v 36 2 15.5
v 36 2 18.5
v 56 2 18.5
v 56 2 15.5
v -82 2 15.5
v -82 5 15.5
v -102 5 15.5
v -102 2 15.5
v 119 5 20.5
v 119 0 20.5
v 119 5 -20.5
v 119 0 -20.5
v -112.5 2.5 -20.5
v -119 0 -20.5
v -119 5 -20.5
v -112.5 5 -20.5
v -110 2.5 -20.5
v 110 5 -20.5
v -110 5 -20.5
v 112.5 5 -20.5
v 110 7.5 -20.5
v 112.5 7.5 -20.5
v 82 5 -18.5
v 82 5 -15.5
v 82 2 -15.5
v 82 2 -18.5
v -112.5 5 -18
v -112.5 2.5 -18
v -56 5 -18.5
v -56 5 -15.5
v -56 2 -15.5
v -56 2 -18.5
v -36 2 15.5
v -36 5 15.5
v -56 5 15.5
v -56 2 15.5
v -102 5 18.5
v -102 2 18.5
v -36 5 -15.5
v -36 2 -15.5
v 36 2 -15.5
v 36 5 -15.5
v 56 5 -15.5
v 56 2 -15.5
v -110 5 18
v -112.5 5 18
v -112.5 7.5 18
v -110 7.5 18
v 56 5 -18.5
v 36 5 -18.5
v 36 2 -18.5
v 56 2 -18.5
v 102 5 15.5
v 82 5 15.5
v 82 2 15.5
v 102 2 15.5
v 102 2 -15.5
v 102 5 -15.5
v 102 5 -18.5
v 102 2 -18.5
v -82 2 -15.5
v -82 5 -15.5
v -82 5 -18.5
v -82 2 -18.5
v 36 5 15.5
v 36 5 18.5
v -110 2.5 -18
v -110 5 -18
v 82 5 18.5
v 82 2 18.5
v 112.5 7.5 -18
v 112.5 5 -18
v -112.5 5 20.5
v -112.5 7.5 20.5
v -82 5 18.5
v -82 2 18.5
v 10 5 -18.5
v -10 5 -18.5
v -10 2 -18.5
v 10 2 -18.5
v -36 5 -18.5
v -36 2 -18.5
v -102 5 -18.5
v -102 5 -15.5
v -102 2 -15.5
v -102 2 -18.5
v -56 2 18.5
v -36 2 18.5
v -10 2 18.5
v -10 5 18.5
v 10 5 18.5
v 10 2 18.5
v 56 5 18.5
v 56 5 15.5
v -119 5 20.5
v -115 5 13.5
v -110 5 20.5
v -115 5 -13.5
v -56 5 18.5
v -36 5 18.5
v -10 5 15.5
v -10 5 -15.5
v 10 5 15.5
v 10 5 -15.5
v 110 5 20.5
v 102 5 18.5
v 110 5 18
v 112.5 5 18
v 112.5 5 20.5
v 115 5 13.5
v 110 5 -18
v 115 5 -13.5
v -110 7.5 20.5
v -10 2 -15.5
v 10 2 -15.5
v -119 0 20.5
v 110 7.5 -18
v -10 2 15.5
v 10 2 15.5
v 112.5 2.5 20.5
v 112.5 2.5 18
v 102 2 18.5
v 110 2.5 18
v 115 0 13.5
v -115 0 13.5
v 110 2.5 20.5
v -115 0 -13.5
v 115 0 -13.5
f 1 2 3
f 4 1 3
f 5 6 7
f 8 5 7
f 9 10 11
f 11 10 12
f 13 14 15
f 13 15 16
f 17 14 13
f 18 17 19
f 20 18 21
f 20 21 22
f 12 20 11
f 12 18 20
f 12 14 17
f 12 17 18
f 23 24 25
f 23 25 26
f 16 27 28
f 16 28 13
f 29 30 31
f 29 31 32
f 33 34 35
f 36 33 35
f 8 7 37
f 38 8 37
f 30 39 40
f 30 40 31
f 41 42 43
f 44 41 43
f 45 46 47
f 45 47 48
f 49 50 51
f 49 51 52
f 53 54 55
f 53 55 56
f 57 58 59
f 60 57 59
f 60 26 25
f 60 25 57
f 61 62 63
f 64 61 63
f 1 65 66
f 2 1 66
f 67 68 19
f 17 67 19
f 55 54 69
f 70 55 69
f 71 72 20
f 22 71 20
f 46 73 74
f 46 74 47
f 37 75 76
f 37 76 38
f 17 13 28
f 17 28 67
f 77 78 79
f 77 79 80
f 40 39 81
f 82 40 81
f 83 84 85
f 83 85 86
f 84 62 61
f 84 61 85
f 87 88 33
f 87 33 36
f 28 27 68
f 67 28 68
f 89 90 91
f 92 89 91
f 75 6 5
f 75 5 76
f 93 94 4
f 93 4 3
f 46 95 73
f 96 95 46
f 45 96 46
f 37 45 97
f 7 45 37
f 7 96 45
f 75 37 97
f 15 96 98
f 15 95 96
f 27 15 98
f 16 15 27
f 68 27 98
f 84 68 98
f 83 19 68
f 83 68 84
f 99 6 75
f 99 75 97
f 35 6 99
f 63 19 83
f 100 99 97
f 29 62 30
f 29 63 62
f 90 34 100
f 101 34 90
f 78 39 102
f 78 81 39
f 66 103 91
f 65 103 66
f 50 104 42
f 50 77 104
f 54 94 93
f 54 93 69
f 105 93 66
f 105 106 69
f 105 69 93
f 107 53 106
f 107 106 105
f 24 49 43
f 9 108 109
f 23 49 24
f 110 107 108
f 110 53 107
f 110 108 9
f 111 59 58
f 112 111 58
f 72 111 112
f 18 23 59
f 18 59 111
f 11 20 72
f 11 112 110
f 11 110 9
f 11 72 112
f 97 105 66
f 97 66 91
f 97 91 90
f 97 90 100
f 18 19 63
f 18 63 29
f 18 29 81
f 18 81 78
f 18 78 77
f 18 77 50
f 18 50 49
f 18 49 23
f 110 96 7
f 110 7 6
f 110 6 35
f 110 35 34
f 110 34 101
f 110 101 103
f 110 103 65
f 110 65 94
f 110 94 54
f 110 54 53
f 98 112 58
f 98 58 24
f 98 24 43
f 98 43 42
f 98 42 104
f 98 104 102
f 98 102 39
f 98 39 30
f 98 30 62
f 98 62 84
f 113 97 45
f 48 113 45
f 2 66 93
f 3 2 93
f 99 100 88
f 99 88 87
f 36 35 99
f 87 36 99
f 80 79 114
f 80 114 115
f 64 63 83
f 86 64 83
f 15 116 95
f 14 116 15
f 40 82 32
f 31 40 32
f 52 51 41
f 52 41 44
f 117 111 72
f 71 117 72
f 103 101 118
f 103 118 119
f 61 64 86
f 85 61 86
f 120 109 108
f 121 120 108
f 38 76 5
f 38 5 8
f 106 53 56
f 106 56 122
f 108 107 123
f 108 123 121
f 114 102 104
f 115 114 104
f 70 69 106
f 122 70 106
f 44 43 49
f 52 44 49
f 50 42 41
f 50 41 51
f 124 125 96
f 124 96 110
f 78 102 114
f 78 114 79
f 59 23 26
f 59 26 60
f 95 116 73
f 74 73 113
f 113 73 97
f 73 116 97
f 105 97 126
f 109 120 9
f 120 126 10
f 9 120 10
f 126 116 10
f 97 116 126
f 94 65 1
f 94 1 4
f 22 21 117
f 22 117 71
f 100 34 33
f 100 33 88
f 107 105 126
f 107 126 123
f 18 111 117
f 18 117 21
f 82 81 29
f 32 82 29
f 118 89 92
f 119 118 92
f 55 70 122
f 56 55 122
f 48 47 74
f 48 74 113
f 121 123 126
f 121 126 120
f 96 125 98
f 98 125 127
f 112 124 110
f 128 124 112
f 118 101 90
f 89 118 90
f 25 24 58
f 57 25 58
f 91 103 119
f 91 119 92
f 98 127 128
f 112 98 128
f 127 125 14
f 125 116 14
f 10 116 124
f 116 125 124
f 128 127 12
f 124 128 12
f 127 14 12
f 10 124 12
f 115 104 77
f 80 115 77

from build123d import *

# Parameters (mm, degrees)
SKETCH_1_W               = 238
SKETCH_1_H               = 41
SKETCH_1_W_2             = 230
SKETCH_1_H_2             = 27
EXTRUDE_1_DEPTH          = 5
SKETCH_2_W               = 20
SKETCH_2_H               = 3
CUT_EXTRUDE_1_DEPTH      = 3
MIRROR_2_COPY_1_SKETCH_W = 20
MIRROR_2_COPY_1_SKETCH_H = 3
MIRROR_2_COPY_1_DEPTH    = 3
SKETCH_3_W               = 2.5
SKETCH_3_H               = 2.5
EXTRUDE_2_DEPTH          = 2.5
SKETCH_3_3_W             = 2.5
SKETCH_3_3_H             = 2.5
CUT_EXTRUDE_2_DEPTH      = 2.5


with BuildPart() as part:
    # 草图1 → 凸台-拉伸1 (new body)
    with BuildSketch(Plane(origin=(0, 0, 0), x_dir=(1, 0, 0), z_dir=(0, 1, 0))):
        Rectangle(SKETCH_1_W, SKETCH_1_H)
        Rectangle(SKETCH_1_W_2, SKETCH_1_H_2, mode=Mode.SUBTRACT)
    extrude(amount=EXTRUDE_1_DEPTH)

    # 草图2 → 切除-拉伸1 (cut)
    with BuildSketch(Plane(origin=(0, 5, 0), x_dir=(1, 0, 0), z_dir=(0, 1, 0))):
        with Locations((0, 17)):
            Rectangle(SKETCH_2_W, SKETCH_2_H)
        with Locations((46, 17)):
            Rectangle(SKETCH_2_W, SKETCH_2_H)
        with Locations((92, 17)):
            Rectangle(SKETCH_2_W, SKETCH_2_H)
    cut_extrude_1 = extrude(amount=-CUT_EXTRUDE_1_DEPTH, mode=Mode.SUBTRACT)

    # 镜向1: 切除-拉伸1 across plane
    add(cut_extrude_1.mirror(Plane.XY), mode=Mode.SUBTRACT)

    # 镜向2: 切除-拉伸1 across plane
    add(cut_extrude_1.mirror(Plane(origin=(0, 0, 0), x_dir=(0, 0, 1), z_dir=(1, 0, 0))), mode=Mode.SUBTRACT)

    # 镜向2 copy 1 sketch → 镜向2 copy 1 (cut)
    with BuildSketch(Plane(origin=(0, 5, 0), x_dir=(-1, 0, 0), z_dir=(0, 1, 0))):
        with Locations((0, 17)):
            Rectangle(MIRROR_2_COPY_1_SKETCH_W, MIRROR_2_COPY_1_SKETCH_H)
        with Locations((46, 17)):
            Rectangle(MIRROR_2_COPY_1_SKETCH_W, MIRROR_2_COPY_1_SKETCH_H)
        with Locations((92, 17)):
            Rectangle(MIRROR_2_COPY_1_SKETCH_W, MIRROR_2_COPY_1_SKETCH_H)
    extrude(amount=-MIRROR_2_COPY_1_DEPTH, mode=Mode.SUBTRACT)

    # 草图3 → 凸台-拉伸2 (add)
    with BuildSketch(Plane(origin=(0, 5, 0), x_dir=(1, 0, 0), z_dir=(0, 1, 0))):
        with Locations((-111.25, -19.25)):
            Rectangle(SKETCH_3_W, SKETCH_3_H)
        with Locations((111.25, 19.25)):
            Rectangle(SKETCH_3_W, SKETCH_3_H)
    extrude(amount=EXTRUDE_2_DEPTH)

    # 草图3<3> → 切除-拉伸2 (cut)
    with BuildSketch(Plane(origin=(0, 5, 0), x_dir=(1, 0, 0), z_dir=(0, 1, 0))):
        with Locations((-111.25, 19.25)):
            Rectangle(SKETCH_3_3_W, SKETCH_3_3_H)
        with Locations((111.25, -19.25)):
            Rectangle(SKETCH_3_3_W, SKETCH_3_3_H)
    extrude(amount=-CUT_EXTRUDE_2_DEPTH, mode=Mode.SUBTRACT)


solid = part.part
